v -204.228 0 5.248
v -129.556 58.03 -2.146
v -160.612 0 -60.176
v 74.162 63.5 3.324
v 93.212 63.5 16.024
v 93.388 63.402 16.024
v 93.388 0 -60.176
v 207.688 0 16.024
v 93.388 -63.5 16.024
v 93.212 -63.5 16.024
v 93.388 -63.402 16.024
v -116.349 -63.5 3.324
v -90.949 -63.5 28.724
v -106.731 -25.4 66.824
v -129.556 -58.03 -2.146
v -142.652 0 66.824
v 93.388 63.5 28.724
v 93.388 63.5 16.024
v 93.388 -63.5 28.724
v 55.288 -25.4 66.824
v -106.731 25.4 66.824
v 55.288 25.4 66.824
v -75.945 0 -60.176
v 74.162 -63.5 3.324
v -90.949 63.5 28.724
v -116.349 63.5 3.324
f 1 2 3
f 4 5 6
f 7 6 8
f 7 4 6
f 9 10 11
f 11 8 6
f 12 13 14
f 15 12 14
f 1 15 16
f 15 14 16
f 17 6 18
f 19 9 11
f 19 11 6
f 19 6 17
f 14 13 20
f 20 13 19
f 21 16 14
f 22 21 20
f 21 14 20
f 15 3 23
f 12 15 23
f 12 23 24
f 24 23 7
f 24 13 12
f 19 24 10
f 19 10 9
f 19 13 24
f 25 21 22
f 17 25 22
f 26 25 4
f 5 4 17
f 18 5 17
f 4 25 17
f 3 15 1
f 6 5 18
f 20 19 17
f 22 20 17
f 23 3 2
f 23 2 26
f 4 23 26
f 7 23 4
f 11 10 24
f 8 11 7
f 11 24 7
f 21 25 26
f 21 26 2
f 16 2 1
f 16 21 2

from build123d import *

# Parameters (mm, degrees)
F0_W         = 254
F0_H         = 76.2
F1_DEPTH     = 63.5
F2_SIZE      = 63.49999
F3_DEPTH     = 63.5
F4_T1_DEPTH  = 463.9752430668
F5_T1_DEPTH  = 463.9752430668
F6_DEPTH     = 63.5
F7_T1_DEPTH  = 418.1847418685
F0_H_2       = 50.8
F8_DEPTH     = 63.5
F9_SIZE      = 38.1
F10_DEPTH    = 63.5
F11_T1_DEPTH = 463.7665363346


# Not quite as in the source:
# - a fillet or chamfer that OpenCascade refuses, or shapes differently, is made with other operations: its cross-section is extruded or revolved along the edge and cut away or added
# - a fillet or chamfer is up to 0.001 mm smaller than in the source, because OpenCascade refuses the exact size


with BuildPart() as f1:
    # F0 (on Front) → F1 (new body, symmetric)
    with BuildSketch(Plane.XZ):
        with Locations((-33.6120952994, -22.0760072346)):
            Rectangle(F0_W, F0_H)
    extrude(amount=F1_DEPTH, both=True)

    # F2 (size 63.5 in the source; OpenCascade refuses exactly that, so slightly less here)
    f2_edges = [f1.edges().sort_by_distance(p)[0] for p in [
        (-33.612095, -63.5, -60.176007),
        (-33.612095, 63.5, -60.176007),
    ]]
    chamfer(f2_edges, length=F2_SIZE)

    # F0 (on Front) → F3 (join, symmetric)
    with BuildSketch(Plane.XZ):
        Polygon((207.6879047006, 16.0239927654), (93.3879047006, 16.0239927654), (93.3879047006, -60.1760072346), align=None)
    extrude(amount=F3_DEPTH, both=True)

    # F4: chamfer of 63.5 on 1 edges, made by hand

    # F4_s2 → F4_t1 (cut)
    with BuildSketch(Plane(origin=(-98.9957457875, 0, -65.9971638583), x_dir=(0, 1, 0), z_dir=(0.8320502943, 0, 0.5547001962))):
        Polygon((-63.5, -38.3717535941), (0, -101.8717535941), (-63.5, -101.8717535941), align=None)
    extrude(amount=F4_T1_DEPTH, mode=Mode.SUBTRACT)

    # F5: chamfer of 63.5 on 1 edges, made by hand

    # F5_s2 → F5_t1 (cut)
    with BuildSketch(Plane(origin=(-98.9957457875, 0, -65.9971638583), x_dir=(0, 1, 0), z_dir=(0.8320502943, 0, 0.5547001962))):
        Polygon((63.5, -38.3717535941), (0, -101.8717535941), (63.5, -101.8717535941), align=None)
    extrude(amount=F5_T1_DEPTH, mode=Mode.SUBTRACT)

    # F0 (on Front) → F6 (join, symmetric)
    with BuildSketch(Plane.XZ):
        Polygon((-160.6120952994, -60.1760072346), (-160.6120952994, 16.0239927654), (-211.4120952994, 16.0239927654), align=None)
    extrude(amount=F6_DEPTH, both=True)

    # F7: chamfer of 63.5 on 2 edges, made by hand

    # F7_s2 → F7_t1 (cut)
    with BuildSketch(Plane(origin=(-163.0291436318, 0, 244.5437154477), x_dir=(0, 1, 0), z_dir=(0.5547001962, 0, -0.8320502943))):
        Polygon((63.5, -103.5169841892), (0, -167.0169841892), (63.5, -167.0169841892), align=None)
        Polygon((-63.5, -103.5169841892), (0, -167.0169841892), (-63.5, -167.0169841892), align=None)
    extrude(amount=F7_T1_DEPTH, mode=Mode.SUBTRACT)

    # F0 (on Front) → F8 (join, symmetric)
    with BuildSketch(Plane.XZ):
        with Locations((-33.6120952994, 41.4239927654)):
            Rectangle(F0_W, F0_H_2)
    extrude(amount=F8_DEPTH, both=True)

    # F9
    f9_edges = [f1.edges().sort_by_distance(p)[0] for p in [
        (-33.612095, -63.5, 66.823993),
        (-33.612095, 63.5, 66.823993),
        (93.387905, 0, 66.823993),
    ]]
    chamfer(f9_edges, length=F9_SIZE)

    # F0 (on Front) → F10 (join, symmetric)
    with BuildSketch(Plane.XZ):
        Polygon((-211.4120952994, 16.0239927654), (-160.6120952994, 16.0239927654), (-160.6120952994, 66.8239927654), align=None)
    extrude(amount=F10_DEPTH, both=True)

    # F11: chamfer of 76.2 on 2 edges, made by hand

    # F11_s2 → F11_t1 (cut)
    with BuildSketch(Plane(origin=(91.6721800978, 0, 91.6721800978), x_dir=(0, 1, 0), z_dir=(-0.7071067812, 0, -0.7071067812))):
        Polygon((-63.5, -84.6216001572), (12.7, -160.8216001572), (-63.5, -160.8216001572), align=None)
        Polygon((63.5, -84.6216001572), (-12.7, -160.8216001572), (63.5, -160.8216001572), align=None)
    extrude(amount=F11_T1_DEPTH, mode=Mode.SUBTRACT)


solid = f1.part
